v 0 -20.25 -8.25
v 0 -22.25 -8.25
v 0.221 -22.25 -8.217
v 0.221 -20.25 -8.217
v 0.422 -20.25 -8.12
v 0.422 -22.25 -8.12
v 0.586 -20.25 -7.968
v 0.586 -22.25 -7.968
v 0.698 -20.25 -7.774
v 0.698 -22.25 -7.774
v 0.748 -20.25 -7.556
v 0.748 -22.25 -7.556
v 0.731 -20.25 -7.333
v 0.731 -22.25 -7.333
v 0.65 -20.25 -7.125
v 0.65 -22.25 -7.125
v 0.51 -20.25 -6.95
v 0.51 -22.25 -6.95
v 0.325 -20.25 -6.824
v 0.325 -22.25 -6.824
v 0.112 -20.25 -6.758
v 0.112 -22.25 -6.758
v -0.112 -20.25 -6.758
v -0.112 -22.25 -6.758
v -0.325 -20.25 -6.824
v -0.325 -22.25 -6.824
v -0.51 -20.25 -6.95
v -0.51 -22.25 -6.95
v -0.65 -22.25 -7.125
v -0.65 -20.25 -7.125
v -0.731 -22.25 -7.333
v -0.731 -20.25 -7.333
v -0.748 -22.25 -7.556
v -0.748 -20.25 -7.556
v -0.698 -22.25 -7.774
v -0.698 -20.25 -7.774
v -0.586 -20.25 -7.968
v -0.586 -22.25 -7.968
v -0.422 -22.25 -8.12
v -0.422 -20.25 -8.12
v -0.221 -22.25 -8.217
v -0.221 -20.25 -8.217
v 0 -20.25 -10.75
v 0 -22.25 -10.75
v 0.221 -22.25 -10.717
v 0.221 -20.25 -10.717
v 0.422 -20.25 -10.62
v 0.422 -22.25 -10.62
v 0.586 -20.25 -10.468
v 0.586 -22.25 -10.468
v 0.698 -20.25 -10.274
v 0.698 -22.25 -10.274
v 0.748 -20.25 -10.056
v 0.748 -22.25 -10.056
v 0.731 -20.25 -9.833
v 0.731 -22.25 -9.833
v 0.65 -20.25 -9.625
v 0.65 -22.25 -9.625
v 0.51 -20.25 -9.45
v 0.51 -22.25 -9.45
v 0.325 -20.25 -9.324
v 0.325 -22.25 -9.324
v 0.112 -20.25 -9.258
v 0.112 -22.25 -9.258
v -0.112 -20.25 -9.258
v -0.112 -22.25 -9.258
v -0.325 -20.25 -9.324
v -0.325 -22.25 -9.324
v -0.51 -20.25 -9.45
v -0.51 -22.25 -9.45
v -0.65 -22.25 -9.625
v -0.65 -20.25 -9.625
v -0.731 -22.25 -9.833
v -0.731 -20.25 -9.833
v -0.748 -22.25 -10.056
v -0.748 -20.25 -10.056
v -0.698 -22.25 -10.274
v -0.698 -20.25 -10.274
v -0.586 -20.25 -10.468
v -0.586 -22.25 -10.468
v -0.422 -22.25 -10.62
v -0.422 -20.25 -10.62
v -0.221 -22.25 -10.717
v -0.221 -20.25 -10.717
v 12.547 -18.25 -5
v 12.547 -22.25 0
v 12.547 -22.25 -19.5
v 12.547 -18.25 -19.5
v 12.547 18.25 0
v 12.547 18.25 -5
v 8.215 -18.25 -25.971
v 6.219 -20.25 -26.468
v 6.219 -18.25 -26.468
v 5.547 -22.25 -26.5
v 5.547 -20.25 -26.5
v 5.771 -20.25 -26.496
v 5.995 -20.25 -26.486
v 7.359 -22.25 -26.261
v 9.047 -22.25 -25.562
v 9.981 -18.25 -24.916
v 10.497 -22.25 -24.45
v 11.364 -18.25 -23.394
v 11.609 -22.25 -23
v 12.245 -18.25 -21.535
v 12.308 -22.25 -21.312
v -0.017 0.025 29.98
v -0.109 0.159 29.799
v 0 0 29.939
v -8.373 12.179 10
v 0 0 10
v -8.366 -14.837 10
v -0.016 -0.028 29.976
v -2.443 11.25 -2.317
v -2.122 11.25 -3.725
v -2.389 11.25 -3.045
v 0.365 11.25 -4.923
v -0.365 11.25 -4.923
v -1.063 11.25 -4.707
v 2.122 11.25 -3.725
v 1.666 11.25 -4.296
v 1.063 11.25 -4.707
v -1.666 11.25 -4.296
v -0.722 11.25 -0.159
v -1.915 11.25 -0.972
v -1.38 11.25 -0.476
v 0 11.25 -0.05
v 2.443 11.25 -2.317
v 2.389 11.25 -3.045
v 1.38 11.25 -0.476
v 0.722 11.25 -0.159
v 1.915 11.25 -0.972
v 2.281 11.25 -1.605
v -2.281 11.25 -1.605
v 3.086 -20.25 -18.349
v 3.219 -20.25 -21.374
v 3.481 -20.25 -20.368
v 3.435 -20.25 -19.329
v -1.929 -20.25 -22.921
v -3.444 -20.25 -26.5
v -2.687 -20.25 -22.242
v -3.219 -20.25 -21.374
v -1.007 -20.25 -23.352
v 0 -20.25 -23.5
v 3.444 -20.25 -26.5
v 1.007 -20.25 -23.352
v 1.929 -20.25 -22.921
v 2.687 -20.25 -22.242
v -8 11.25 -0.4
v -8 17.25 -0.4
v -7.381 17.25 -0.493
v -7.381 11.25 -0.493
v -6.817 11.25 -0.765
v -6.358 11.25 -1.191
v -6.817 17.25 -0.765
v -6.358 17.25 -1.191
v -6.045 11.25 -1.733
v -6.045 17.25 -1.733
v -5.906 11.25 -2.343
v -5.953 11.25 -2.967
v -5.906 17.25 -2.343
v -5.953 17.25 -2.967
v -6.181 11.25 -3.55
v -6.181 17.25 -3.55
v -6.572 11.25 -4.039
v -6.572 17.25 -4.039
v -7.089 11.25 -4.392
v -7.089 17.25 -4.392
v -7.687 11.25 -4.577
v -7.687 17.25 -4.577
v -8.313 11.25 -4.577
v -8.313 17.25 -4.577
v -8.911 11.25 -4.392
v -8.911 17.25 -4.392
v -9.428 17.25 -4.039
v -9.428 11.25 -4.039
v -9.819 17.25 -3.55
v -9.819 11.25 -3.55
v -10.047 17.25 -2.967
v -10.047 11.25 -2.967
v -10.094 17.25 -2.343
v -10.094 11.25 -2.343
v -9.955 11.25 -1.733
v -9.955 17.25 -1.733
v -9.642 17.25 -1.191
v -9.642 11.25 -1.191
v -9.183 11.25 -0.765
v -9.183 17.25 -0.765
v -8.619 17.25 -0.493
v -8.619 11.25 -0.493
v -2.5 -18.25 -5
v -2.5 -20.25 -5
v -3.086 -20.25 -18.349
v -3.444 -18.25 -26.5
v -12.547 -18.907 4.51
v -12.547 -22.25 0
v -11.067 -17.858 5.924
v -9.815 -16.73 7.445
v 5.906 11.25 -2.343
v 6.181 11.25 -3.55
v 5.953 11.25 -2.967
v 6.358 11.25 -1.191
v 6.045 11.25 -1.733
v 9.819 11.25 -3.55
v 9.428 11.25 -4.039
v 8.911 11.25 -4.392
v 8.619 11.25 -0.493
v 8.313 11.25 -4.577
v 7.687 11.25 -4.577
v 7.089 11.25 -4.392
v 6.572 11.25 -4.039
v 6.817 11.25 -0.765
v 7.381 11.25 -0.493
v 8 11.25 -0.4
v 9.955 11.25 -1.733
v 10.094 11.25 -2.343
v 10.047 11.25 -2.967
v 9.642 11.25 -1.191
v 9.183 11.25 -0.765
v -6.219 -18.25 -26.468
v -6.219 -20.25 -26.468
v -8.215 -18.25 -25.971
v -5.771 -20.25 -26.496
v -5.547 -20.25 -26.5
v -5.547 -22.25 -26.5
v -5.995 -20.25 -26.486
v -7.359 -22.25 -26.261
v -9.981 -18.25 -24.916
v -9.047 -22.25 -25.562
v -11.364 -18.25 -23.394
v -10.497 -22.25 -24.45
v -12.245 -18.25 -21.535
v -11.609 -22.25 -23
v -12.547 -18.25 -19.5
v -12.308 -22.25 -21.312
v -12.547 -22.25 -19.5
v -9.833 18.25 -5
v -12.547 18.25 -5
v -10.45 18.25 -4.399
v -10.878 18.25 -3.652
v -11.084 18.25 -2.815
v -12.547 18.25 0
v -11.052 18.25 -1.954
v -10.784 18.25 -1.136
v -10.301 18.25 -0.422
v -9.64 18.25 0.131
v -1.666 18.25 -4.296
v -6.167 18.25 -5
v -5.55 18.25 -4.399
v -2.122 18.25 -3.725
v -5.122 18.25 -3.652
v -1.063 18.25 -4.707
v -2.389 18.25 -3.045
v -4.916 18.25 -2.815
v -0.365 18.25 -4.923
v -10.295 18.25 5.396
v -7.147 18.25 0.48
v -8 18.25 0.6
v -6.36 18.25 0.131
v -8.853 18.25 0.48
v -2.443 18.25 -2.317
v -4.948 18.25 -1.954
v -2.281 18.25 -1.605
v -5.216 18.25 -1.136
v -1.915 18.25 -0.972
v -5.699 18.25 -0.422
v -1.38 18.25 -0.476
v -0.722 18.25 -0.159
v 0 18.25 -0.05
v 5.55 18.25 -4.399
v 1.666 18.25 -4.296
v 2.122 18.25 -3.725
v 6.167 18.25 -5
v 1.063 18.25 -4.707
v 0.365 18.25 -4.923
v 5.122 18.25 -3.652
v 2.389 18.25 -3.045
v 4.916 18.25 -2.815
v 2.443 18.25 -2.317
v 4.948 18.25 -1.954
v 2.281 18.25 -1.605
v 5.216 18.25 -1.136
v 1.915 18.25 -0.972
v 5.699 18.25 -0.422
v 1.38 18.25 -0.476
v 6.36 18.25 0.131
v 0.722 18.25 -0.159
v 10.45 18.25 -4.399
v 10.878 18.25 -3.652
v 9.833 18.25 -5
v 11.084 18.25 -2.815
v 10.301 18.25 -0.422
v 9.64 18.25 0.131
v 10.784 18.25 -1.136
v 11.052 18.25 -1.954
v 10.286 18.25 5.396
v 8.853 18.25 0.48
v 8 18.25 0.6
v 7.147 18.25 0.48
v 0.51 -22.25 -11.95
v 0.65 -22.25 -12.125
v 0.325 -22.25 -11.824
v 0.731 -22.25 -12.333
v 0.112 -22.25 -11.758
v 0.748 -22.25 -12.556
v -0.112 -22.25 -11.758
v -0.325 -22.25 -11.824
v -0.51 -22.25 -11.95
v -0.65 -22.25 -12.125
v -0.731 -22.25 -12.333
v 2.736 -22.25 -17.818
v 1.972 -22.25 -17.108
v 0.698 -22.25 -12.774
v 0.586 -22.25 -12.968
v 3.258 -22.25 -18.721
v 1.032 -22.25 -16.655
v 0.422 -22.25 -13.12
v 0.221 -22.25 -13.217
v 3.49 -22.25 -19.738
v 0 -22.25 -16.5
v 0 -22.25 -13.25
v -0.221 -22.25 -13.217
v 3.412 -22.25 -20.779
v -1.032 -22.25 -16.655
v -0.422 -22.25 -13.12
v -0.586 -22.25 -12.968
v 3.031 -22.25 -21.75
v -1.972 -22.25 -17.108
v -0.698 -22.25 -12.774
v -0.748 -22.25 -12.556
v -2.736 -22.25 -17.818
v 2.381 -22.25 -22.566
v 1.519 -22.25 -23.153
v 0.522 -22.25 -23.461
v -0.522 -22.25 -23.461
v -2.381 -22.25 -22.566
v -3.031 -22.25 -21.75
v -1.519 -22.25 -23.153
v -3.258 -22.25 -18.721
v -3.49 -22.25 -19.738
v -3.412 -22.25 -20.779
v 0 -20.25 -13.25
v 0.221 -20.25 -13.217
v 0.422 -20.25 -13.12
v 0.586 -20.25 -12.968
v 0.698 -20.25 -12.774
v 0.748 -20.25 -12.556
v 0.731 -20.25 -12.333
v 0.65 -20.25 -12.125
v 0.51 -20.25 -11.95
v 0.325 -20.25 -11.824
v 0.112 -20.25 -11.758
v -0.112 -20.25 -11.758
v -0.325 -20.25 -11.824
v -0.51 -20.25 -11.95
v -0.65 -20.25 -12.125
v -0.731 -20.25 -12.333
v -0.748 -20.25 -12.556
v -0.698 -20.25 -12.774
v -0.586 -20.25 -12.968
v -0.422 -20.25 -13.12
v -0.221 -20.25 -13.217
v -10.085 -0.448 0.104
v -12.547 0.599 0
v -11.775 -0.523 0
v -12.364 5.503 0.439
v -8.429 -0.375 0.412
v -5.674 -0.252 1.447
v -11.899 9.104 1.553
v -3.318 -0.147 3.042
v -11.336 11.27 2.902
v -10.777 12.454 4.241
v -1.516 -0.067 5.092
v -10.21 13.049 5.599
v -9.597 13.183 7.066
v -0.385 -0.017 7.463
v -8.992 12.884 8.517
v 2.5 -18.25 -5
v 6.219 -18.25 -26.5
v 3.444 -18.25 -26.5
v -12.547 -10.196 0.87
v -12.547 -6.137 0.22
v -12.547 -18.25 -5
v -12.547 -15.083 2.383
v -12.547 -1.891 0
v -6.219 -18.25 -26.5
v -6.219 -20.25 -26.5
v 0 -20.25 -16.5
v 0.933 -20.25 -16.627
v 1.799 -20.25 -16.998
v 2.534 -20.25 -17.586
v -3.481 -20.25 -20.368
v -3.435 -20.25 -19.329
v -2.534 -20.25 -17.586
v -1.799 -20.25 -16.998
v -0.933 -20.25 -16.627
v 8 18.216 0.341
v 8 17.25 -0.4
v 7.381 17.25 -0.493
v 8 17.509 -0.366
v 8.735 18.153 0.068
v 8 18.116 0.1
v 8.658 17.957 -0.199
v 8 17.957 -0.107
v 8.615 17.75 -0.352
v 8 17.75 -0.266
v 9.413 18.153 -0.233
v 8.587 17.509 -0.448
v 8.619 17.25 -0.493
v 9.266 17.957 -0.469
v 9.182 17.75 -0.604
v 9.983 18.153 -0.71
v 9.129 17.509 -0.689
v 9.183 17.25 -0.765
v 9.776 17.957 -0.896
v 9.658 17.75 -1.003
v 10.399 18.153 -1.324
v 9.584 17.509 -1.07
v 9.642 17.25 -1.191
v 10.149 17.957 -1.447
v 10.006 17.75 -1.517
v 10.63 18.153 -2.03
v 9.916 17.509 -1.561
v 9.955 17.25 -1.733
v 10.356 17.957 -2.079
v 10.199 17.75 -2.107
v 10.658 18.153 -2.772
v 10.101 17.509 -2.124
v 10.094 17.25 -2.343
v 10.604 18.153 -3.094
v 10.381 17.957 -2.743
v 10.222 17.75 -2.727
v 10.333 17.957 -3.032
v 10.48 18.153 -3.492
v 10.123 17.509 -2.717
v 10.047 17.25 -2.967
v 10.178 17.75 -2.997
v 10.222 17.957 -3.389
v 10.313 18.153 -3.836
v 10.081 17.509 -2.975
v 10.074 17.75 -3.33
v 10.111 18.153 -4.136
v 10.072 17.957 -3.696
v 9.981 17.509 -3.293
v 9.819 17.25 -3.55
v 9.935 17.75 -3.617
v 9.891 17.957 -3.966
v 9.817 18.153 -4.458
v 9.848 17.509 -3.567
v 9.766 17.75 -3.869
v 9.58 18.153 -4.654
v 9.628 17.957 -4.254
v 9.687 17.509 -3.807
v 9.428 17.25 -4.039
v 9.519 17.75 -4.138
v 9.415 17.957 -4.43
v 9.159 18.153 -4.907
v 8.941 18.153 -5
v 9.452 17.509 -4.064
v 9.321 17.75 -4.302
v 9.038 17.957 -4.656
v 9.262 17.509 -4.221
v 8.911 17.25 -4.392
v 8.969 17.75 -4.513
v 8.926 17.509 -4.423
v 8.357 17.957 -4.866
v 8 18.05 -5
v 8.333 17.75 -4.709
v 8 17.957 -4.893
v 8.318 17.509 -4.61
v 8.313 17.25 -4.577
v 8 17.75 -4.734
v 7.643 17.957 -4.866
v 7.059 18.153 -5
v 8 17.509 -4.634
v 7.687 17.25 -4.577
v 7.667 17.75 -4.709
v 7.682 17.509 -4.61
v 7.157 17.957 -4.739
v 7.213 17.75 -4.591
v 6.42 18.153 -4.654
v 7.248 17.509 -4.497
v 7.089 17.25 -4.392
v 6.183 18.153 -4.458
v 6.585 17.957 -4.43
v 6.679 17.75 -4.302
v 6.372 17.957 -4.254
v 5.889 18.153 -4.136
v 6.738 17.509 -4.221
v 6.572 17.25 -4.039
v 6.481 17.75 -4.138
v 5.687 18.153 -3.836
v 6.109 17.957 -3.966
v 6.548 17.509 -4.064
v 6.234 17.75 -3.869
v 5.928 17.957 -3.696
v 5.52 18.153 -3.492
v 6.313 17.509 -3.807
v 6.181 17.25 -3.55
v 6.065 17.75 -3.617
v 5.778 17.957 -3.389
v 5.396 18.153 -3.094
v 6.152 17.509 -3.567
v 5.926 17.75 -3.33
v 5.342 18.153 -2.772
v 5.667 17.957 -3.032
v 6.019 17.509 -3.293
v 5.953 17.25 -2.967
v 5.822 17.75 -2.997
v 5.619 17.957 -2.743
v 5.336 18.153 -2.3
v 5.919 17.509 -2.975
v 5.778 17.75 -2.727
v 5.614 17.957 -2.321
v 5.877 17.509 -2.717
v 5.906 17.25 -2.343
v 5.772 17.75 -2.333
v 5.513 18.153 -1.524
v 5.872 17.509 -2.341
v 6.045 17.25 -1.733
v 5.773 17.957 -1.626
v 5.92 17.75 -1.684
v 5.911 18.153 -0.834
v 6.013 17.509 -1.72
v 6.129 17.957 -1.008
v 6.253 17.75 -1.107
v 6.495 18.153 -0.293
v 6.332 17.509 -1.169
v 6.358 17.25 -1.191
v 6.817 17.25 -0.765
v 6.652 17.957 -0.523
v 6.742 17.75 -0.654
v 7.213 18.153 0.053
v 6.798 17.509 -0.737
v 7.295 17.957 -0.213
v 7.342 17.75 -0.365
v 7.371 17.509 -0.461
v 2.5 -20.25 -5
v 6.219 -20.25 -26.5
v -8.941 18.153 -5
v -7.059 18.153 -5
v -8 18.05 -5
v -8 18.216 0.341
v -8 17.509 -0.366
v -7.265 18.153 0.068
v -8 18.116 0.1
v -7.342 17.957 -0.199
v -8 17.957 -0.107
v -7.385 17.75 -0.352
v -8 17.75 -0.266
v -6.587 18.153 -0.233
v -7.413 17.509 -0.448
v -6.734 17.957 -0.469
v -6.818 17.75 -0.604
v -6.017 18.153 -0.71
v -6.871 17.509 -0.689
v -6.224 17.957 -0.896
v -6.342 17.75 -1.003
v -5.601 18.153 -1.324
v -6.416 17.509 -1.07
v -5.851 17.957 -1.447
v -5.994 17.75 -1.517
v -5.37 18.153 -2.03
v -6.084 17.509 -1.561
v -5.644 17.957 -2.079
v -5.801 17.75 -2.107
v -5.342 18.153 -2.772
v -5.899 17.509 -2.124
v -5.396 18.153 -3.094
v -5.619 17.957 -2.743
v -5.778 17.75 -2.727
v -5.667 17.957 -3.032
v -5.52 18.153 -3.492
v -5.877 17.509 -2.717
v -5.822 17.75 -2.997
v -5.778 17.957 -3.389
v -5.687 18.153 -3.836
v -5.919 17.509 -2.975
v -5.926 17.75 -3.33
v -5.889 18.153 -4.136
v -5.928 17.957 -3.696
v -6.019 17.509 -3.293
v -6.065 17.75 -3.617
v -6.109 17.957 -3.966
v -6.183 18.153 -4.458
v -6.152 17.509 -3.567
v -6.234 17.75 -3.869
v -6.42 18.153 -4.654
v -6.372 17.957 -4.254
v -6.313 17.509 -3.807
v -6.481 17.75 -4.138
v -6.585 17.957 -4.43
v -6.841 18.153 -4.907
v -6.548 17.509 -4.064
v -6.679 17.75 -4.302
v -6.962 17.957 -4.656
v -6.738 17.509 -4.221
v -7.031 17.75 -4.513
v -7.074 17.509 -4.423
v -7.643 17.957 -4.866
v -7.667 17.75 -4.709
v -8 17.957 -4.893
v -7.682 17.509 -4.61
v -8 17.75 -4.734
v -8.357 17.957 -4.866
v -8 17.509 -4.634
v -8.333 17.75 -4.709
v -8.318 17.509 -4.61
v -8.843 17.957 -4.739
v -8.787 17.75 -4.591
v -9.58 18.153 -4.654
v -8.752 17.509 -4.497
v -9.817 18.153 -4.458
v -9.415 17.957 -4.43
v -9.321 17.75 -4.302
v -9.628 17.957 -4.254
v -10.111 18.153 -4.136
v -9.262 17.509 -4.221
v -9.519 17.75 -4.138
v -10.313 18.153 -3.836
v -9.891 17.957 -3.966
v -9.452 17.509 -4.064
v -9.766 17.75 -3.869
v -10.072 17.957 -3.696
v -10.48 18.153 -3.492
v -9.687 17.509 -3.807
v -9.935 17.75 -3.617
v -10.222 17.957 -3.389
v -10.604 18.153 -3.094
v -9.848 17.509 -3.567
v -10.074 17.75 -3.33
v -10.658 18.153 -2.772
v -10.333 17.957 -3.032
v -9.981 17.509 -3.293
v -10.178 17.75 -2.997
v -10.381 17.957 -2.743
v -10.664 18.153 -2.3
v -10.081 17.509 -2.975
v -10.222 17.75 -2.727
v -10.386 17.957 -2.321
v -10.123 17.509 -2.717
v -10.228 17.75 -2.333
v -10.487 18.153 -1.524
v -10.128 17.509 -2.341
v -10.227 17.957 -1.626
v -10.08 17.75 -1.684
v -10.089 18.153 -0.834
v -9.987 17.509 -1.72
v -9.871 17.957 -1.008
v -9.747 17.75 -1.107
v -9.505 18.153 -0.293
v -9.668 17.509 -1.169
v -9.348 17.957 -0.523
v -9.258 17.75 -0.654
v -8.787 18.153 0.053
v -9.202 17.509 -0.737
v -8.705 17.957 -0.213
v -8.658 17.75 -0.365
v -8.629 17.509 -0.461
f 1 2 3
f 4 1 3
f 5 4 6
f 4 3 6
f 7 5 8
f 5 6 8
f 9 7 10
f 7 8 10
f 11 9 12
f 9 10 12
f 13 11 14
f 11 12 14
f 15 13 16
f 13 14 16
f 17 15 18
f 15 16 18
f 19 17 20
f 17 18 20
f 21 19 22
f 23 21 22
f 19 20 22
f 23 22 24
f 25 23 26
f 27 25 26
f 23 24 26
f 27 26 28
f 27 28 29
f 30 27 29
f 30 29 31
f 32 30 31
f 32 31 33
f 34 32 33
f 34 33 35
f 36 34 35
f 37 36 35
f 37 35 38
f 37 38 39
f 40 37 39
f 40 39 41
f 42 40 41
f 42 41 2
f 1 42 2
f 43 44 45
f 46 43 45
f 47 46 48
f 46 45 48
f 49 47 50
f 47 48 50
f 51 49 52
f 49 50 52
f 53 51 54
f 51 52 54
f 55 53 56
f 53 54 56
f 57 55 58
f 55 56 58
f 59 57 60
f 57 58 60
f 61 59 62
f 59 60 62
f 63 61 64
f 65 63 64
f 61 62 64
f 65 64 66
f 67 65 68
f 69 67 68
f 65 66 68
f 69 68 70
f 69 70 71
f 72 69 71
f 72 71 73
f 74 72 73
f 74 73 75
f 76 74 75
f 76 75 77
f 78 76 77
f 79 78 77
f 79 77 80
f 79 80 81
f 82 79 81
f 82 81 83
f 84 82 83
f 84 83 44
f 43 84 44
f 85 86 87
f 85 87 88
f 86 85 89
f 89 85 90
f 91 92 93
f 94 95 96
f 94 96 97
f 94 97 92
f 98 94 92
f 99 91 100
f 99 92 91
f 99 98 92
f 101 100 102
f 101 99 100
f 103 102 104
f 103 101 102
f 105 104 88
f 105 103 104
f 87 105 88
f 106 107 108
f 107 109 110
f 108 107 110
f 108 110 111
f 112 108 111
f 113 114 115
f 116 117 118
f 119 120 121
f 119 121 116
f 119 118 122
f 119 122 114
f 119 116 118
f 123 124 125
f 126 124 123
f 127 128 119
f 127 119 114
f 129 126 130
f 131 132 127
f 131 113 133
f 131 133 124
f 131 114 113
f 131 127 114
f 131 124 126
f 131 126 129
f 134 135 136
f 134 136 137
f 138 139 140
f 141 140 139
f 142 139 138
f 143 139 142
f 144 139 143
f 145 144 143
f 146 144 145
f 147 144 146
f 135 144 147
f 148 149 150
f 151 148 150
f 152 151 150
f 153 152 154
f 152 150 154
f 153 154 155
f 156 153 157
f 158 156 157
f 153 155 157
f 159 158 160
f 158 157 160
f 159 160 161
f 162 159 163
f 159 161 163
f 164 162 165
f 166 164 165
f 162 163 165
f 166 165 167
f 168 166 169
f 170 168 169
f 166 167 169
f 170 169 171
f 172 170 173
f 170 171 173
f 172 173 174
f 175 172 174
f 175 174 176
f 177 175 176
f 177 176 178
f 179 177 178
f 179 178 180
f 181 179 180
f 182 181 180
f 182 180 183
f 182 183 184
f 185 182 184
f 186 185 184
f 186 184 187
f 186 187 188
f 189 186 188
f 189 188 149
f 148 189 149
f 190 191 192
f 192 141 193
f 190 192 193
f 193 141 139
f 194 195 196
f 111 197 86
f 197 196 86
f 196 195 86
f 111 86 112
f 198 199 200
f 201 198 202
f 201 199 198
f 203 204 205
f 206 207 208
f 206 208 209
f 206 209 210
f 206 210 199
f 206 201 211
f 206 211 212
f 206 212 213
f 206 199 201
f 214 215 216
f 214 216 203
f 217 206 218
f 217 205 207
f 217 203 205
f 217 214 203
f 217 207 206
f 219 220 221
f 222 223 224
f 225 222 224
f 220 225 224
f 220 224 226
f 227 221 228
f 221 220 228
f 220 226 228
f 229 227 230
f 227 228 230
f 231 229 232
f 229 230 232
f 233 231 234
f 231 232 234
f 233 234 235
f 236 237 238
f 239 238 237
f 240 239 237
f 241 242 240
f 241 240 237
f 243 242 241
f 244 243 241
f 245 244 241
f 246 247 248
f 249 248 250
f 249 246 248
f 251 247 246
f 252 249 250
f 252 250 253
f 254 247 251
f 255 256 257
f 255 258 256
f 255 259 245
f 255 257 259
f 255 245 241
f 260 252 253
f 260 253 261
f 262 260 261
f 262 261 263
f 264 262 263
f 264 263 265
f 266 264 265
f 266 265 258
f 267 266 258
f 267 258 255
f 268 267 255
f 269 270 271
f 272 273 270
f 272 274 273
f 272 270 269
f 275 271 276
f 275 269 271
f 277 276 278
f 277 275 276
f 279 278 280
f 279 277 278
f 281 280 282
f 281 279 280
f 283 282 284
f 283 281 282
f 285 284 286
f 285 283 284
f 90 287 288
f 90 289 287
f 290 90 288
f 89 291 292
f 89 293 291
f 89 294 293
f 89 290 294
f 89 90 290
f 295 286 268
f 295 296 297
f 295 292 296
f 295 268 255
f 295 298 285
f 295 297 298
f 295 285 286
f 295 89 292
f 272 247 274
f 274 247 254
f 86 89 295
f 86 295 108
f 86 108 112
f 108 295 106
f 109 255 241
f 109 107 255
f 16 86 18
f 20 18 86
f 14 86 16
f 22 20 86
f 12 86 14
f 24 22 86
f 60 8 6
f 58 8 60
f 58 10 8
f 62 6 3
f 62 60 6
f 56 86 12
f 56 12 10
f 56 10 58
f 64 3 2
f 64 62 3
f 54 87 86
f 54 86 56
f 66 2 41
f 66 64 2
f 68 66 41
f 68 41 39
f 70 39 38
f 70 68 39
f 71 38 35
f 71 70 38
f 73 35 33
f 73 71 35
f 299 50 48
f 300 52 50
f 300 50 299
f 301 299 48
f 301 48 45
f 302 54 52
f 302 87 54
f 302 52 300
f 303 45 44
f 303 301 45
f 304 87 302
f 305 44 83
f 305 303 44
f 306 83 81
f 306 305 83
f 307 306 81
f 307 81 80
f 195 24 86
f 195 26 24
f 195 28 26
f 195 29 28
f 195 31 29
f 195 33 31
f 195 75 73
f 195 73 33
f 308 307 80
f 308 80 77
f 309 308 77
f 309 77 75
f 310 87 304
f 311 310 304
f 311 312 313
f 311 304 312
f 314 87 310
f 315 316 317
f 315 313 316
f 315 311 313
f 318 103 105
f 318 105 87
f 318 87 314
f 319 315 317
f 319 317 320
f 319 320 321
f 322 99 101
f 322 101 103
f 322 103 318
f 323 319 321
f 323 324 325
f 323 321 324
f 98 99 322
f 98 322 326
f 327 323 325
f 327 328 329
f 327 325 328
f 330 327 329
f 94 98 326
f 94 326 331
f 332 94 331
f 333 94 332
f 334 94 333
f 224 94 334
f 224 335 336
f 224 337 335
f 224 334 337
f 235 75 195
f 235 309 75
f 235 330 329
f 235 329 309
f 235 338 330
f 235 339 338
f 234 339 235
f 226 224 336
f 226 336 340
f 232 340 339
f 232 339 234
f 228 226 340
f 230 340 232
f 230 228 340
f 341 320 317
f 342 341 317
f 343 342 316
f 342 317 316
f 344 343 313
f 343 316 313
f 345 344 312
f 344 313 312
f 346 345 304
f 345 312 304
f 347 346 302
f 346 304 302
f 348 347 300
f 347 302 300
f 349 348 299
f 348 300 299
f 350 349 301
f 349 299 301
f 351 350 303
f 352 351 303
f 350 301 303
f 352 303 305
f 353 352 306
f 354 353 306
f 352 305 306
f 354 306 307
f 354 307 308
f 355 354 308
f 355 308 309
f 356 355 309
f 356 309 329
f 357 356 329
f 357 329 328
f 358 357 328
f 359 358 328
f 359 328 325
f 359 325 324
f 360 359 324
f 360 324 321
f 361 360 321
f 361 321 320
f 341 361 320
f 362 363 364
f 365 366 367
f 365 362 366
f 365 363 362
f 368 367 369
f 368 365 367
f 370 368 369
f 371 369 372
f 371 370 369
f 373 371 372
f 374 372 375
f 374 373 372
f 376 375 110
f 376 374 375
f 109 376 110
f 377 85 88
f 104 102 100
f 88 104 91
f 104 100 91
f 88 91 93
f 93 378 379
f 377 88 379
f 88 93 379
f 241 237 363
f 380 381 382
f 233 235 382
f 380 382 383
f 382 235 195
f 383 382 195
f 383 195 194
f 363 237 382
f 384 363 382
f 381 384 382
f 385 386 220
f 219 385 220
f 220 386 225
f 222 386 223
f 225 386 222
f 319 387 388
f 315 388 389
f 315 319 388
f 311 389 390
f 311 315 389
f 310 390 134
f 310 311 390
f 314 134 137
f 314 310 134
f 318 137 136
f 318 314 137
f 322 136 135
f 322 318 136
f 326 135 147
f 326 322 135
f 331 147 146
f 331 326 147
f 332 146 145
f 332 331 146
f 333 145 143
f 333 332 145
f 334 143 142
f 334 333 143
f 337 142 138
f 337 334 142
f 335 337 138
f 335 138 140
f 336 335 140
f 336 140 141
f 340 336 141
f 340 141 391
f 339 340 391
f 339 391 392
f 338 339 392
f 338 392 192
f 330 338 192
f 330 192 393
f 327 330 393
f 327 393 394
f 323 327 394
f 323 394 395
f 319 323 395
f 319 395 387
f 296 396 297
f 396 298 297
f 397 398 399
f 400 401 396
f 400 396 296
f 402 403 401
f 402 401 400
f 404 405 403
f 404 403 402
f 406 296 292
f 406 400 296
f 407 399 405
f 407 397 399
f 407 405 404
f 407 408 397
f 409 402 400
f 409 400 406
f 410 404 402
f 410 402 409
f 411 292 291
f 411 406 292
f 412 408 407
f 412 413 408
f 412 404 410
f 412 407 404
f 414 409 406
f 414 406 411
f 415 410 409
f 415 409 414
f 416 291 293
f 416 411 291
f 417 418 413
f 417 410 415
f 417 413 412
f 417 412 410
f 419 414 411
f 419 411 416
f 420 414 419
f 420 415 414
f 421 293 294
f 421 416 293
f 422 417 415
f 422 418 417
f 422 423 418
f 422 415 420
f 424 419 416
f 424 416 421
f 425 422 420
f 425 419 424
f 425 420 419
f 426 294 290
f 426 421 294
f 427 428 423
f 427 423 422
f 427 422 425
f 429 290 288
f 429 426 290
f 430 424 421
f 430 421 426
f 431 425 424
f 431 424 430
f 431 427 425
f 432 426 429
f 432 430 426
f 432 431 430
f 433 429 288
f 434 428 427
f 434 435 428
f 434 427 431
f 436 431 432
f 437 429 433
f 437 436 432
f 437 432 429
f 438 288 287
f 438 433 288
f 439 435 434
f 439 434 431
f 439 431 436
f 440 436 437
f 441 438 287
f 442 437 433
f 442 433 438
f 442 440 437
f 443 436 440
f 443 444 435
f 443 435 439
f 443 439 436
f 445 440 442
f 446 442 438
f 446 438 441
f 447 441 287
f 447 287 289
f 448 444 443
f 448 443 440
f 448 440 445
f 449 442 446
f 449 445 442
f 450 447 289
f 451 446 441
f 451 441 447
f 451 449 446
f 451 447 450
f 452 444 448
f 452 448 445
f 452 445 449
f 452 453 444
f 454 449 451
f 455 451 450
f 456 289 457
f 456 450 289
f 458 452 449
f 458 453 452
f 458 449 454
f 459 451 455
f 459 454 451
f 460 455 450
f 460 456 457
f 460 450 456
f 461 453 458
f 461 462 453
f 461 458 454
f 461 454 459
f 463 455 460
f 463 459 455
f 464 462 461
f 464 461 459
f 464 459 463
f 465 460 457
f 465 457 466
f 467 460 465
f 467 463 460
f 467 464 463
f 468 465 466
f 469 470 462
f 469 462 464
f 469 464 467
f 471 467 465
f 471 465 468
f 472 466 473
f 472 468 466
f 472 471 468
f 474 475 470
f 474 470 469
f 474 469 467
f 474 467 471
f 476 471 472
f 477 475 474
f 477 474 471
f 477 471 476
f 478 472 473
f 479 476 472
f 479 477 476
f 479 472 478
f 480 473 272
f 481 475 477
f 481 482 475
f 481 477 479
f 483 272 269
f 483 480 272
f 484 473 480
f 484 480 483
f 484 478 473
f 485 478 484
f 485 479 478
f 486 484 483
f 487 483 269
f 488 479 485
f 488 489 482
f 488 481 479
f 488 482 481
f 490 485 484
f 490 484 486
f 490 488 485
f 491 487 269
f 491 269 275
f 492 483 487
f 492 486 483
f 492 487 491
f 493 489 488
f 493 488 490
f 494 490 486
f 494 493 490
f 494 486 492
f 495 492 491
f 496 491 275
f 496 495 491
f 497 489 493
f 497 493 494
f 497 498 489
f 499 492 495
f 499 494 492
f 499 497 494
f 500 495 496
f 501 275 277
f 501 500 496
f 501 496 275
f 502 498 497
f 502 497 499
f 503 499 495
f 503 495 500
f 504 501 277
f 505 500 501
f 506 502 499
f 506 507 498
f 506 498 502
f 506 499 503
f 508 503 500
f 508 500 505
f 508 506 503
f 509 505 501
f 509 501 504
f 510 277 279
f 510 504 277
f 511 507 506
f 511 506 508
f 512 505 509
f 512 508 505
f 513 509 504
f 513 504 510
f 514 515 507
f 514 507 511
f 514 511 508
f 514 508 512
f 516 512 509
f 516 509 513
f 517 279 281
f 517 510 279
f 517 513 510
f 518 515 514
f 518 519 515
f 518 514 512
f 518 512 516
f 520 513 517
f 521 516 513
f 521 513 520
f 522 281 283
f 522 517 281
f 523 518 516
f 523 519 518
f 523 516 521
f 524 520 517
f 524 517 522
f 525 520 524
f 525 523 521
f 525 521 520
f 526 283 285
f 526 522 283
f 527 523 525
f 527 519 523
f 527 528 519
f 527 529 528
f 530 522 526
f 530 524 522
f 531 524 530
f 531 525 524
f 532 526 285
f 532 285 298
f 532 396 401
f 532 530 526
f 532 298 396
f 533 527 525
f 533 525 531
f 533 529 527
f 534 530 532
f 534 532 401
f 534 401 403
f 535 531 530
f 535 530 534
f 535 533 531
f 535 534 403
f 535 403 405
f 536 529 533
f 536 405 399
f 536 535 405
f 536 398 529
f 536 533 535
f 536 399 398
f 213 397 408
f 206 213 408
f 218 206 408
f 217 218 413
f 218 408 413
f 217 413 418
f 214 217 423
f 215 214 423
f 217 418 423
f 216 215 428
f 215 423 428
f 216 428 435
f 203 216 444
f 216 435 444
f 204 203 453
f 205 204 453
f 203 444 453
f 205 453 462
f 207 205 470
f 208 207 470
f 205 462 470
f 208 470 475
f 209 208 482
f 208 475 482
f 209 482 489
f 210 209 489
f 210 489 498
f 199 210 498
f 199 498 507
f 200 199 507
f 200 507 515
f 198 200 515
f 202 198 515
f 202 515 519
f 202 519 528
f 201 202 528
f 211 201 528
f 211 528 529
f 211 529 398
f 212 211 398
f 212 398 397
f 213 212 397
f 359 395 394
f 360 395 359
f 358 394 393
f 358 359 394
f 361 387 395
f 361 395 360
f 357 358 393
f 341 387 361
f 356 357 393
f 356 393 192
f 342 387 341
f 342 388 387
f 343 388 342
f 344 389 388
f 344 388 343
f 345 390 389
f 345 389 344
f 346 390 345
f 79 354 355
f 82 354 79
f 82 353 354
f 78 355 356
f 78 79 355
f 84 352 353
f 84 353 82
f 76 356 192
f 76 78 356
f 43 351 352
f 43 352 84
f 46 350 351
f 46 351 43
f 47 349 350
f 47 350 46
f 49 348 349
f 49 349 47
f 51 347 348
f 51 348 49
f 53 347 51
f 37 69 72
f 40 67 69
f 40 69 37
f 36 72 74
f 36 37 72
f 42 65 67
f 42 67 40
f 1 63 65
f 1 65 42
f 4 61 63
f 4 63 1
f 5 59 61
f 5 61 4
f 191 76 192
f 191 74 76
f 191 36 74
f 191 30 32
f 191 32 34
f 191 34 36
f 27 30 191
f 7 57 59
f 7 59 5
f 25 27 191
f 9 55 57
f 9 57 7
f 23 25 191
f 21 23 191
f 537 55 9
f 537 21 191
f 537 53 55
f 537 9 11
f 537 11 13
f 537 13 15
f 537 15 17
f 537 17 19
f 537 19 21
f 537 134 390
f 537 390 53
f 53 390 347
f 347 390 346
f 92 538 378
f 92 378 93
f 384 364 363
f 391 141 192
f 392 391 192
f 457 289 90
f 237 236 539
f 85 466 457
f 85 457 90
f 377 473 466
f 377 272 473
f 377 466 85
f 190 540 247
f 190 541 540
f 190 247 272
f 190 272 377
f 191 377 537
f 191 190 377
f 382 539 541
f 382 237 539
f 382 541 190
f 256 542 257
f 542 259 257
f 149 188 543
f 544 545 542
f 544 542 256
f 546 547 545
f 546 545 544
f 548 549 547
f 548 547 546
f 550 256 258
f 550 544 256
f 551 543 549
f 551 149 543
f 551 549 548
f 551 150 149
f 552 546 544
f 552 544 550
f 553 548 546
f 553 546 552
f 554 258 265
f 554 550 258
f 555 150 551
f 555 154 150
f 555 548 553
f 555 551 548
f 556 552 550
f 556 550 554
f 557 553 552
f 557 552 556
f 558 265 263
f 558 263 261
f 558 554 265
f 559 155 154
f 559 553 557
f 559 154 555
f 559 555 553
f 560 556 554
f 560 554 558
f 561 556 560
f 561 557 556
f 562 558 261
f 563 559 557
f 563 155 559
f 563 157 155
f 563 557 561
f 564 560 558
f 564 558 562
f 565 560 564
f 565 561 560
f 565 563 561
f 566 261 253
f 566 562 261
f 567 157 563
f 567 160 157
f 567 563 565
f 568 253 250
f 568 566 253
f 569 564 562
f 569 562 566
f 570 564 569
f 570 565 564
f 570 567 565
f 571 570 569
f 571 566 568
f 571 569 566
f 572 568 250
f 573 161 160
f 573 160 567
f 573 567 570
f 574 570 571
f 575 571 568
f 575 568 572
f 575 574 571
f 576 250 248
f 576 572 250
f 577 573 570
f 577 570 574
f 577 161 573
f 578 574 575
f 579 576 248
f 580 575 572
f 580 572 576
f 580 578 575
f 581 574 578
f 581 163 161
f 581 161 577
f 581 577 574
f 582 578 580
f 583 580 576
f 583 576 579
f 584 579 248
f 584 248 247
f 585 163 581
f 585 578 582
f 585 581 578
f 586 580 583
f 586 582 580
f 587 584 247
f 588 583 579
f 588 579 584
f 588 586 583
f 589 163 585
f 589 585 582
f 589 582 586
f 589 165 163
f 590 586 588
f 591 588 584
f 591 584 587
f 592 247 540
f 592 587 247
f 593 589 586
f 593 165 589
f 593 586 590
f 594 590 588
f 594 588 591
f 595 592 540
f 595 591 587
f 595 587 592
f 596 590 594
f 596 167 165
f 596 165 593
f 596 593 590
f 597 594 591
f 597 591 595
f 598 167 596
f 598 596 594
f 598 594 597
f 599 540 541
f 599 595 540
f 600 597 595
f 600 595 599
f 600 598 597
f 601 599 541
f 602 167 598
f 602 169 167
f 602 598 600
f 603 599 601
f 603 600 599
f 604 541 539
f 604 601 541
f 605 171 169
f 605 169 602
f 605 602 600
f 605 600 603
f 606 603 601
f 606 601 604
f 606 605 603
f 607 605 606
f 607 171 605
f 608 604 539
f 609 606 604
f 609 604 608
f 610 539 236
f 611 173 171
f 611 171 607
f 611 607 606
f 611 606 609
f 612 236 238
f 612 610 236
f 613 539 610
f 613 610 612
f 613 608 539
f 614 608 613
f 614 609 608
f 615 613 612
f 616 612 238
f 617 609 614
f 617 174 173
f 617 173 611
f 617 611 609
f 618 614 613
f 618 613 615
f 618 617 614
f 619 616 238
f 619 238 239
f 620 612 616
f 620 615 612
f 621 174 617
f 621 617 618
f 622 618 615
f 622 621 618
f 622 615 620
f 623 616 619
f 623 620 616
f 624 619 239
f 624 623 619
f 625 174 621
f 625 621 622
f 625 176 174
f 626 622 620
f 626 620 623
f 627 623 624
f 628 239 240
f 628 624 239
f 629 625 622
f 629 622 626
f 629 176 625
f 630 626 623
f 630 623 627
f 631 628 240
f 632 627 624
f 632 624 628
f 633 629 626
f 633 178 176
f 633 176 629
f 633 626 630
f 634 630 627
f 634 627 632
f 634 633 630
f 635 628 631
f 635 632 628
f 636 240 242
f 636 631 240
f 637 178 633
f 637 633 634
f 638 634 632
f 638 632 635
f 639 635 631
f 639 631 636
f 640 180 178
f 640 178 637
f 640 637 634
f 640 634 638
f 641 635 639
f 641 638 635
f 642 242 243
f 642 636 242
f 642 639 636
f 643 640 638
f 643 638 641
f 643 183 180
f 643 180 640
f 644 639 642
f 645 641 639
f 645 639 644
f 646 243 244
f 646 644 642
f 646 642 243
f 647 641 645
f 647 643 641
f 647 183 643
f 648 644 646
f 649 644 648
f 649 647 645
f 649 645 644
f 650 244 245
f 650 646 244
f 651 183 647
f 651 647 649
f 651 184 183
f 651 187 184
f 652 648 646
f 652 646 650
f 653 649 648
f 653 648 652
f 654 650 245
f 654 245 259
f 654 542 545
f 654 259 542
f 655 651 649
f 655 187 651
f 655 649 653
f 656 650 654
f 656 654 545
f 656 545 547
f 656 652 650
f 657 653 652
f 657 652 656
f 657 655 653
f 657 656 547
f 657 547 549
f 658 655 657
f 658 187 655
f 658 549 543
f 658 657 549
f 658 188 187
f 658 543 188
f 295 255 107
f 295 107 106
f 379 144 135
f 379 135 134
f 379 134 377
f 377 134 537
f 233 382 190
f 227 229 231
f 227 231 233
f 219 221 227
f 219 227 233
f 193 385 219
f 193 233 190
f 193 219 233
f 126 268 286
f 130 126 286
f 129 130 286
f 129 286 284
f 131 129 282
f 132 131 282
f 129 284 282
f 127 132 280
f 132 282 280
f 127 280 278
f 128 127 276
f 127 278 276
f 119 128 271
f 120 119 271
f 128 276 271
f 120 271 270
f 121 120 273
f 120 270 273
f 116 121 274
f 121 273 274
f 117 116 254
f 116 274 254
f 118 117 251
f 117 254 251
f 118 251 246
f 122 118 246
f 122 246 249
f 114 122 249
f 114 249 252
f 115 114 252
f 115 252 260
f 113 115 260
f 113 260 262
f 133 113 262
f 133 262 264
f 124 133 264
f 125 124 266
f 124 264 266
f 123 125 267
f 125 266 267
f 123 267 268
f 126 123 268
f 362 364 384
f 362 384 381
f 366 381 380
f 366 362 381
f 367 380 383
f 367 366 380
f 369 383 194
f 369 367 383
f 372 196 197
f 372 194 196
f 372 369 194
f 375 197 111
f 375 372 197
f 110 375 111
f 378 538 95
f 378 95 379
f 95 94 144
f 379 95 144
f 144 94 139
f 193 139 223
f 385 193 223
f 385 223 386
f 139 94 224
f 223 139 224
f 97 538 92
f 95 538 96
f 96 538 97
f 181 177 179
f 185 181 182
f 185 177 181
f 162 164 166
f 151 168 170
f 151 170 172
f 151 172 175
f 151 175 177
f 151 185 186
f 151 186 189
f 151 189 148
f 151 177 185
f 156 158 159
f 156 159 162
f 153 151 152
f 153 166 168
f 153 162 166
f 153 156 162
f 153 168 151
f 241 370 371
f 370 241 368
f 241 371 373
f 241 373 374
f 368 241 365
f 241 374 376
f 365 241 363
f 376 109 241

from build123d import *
from OCP.BRepFilletAPI import BRepFilletAPI_MakeChamfer

# Parameters (mm, degrees)
SKETCH4_W                = 12.46
SKETCH4_H                = 17.25
BOSS_EXTRUDE3_DEPTH      = 6
BOSS_EXTRUDE6_DEPTH      = 7.3
BOSS_EXTRUDE6_DEPTH_BACK = 17.25
SKETCH8_R                = 12.546781182
SKETCH8_R_2              = 11.15
BOSS_EXTRUDE4_DEPTH      = 17.25
SKETCH6_R                = 2
CUT_EXTRUDE1_DEPTH       = 5
CHAMFER1_SIZE            = 0.5
CHAMFER1_SIZE_2          = 0.866025404
SKETCH10_W               = 12.46
SKETCH10_H               = 23.7
CUT_EXTRUDE3_DEPTH       = 17.25
CUT_EXTRUDE4_REACH       = 43.938
SKETCH11_W               = 5
SKETCH11_H               = 3
BOSS_EXTRUDE7_START      = -7.3
BOSS_EXTRUDE7_DEPTH      = 7.3
BOSS_EXTRUDE9_START      = 10
BOSS_EXTRUDE9_DEPTH      = 10
BOSS_EXTRUDE10_DEPTH     = 25.093562364
SKETCH18_W               = 21.5
SKETCH18_H               = 12.438292938
CUT_EXTRUDE5_DEPTH       = 2
CUT_EXTRUDE6_DEPTH       = 58.154608998
CUT_EXTRUDE6_DEPTH_BACK  = 58.154608998
SKETCH19_R               = 3.5
FILLET1_R                = 7
CUT_EXTRUDE7_DEPTH       = 55.97840444
CUT_EXTRUDE7_DEPTH_BACK  = 55.97840444
SKETCH20_W               = 25.093562364
SKETCH20_H               = 36.096781182
BOSS_EXTRUDE11_DEPTH     = 44.5
CUT_EXTRUDE8_DEPTH       = 40.401576339
CUT_EXTRUDE8_DEPTH_BACK  = 40.401576339
CUT_EXTRUDE9_DEPTH       = 40.401576339
SKETCH24_R               = 6.5
BOSS_EXTRUDE12_DEPTH     = 5
SKETCH25_R               = 6.075
BOSS_EXTRUDE13_DEPTH     = 5
FILLET2_R                = 1
BOSS_EXTRUDE14_DEPTH     = 2
CUT_EXTRUDE10_REACH      = 57.104
SKETCH27_R               = 0.75
CUT_EXTRUDE11_DEPTH      = 45.983908275
SKETCH29_R               = 2.1
SKETCH29_R_2             = 2.45
CUT_EXTRUDE12_DEPTH      = 7
FILLET3_R                = 10
FILLET4_R                = 1


# Some blends are built 0.0001 mm under size
with BuildPart() as part:
    # Sketch4 → Boss-Extrude3 (new body)
    with BuildSketch(Plane.XY):
        with Locations((0, -1.35)):
            Rectangle(SKETCH4_W, SKETCH4_H)
    extrude(amount=BOSS_EXTRUDE3_DEPTH)



with BuildPart() as body_2:
    # Sketch8 → Boss-Extrude6 (new, two sides: drawn at the far end of the back side and taken through both)
    with BuildSketch(Plane(origin=(0, -9.975, 0), x_dir=(-1, 0, 0), z_dir=(0, -1, 0)).offset(-BOSS_EXTRUDE6_DEPTH_BACK)):
        with Locations(Location((0, -23.55, 0), (0, 0, 90))):
            Circle(SKETCH8_R)
        with Locations(Location((0, -23.55, 0), (0, 0, 90))):
            Circle(SKETCH8_R_2, mode=Mode.SUBTRACT)
    extrude(amount=BOSS_EXTRUDE6_DEPTH + BOSS_EXTRUDE6_DEPTH_BACK)


with BuildPart() as part_1:
    add(part.part)

    add(body_2.part)  # Boss-Extrude4 merges body 2
    # Sketch5 → Boss-Extrude4 (add)
    with BuildSketch(Plane(origin=(0, 7.275, 0), x_dir=(1, 0, 0), z_dir=(0, 1, 0))):
        with BuildLine():
            Line((12.546781182, -23.55), (12.546781182, 0))
            Line((12.546781182, 0), (6.23, 0))
            Line((6.23, 0), (6.23, -29.7))
            Line((6.23, -29.7), (-6.23, -29.7))
            Line((-6.23, -29.7), (-6.23, 0))
            Line((-6.23, 0), (-12.546781182, 0))
            Line((-12.546781182, 0), (-12.546781182, -23.55))
            ThreePointArc((-12.546781182, -23.55), (0, -36.096781182), (12.546781182, -23.55))
        make_face()
    extrude(amount=-BOSS_EXTRUDE4_DEPTH)

    # Sketch6 → Cut-Extrude1 (cut)
    with BuildSketch(Plane(origin=(0, 7.275, 0), x_dir=(1, 0, 0), z_dir=(0, 1, 0))):
        with Locations(Location((0, -3.5, 0), (0, 0, 270))):
            Circle(SKETCH6_R)
        with Locations(Location((0, -32.2, 0), (0, 0, 270))):
            Circle(SKETCH6_R)
    extrude(amount=-CUT_EXTRUDE1_DEPTH, mode=Mode.SUBTRACT)

    # Chamfer1
    chamfer1_edges_1 = [part_1.edges().sort_by_distance(p)[0] for p in [
        (0, 7.275, 1.5),
    ]]
    chamfer1_side_1 = [part_1.faces().sort_by_distance(p)[0] for p in [
        (0, 7.275, 1.49),
    ]]
    chamfer1_edges_2 = [part_1.edges().sort_by_distance(p)[0] for p in [
        (0, 7.275, 30.2),
    ]]
    chamfer1_side_2 = [part_1.faces().sort_by_distance(p)[0] for p in [
        (0, 7.275, 30.19),
    ]]
    chamfer1 = BRepFilletAPI_MakeChamfer(part_1.part.solid().wrapped)
    for e in chamfer1_edges_1:
        chamfer1.Add(CHAMFER1_SIZE - 0.0001, CHAMFER1_SIZE_2 - 0.0001, e.wrapped, chamfer1_side_1[0].wrapped)
    for e in chamfer1_edges_2:
        chamfer1.Add(CHAMFER1_SIZE - 0.0001, CHAMFER1_SIZE_2 - 0.0001, e.wrapped, chamfer1_side_2[0].wrapped)
    add(Compound.cast(chamfer1.Shape()), mode=Mode.REPLACE)  # a hair under: the kernel refuses the full size

    # Sketch10 → Cut-Extrude3 (cut)
    with BuildSketch(Plane(origin=(0, 7.275, 0), x_dir=(1, 0, 0), z_dir=(0, 1, 0))):
        with Locations((0, -17.85)):
            Rectangle(SKETCH10_W, SKETCH10_H)
    extrude(amount=-CUT_EXTRUDE3_DEPTH, mode=Mode.SUBTRACT)

    # Sketch11 → Cut-Extrude4 (cut, up to next)
    with BuildSketch(Plane.XY.offset(36.096781182), mode=Mode.PRIVATE) as cut_extrude4_sk1:
        with Locations((0, -8.475)):
            Rectangle(SKETCH11_W, SKETCH11_H)
    cut_extrude4_tool1 = extrude(cut_extrude4_sk1.sketch, amount=-CUT_EXTRUDE4_REACH, mode=Mode.PRIVATE) & part_1.part
    add(cut_extrude4_tool1.solids().sort_by_distance((0, -8.475, 36.096781))[0], mode=Mode.SUBTRACT)

    # Sketch13 → Boss-Extrude7 (add)
    with BuildSketch(Plane.XZ.offset(17.275).offset(BOSS_EXTRUDE7_START)):
        with BuildLine():
            Line((-12.546781182, 23.55), (-12.546781182, 0))
            Line((-12.546781182, 0), (12.546781182, 0))
            Line((12.546781182, 0), (12.546781182, 23.55))
            ThreePointArc((12.546781182, 23.55), (0, 11.003218818), (-12.546781182, 23.55))
        make_face()
    extrude(amount=BOSS_EXTRUDE7_DEPTH)

    # Sketch15 → Boss-Extrude9 (add)
    with BuildSketch(Plane(origin=(0, 7.275, 0), x_dir=(1, 0, 0), z_dir=(0, 1, 0)).offset(BOSS_EXTRUDE9_START)):
        with BuildLine():
            Line((-12.546781182, 0), (12.546781182, 0))
            Line((12.546781182, 0), (12.546781182, -23.55))
            ThreePointArc((12.546781182, -23.55), (0, -36.096781182), (-12.546781182, -23.55))
            Line((-12.546781182, -23.55), (-12.546781182, 0))
        make_face()
        with BuildLine():
            Line((-6.23, -0.8), (6.23, -0.8))
            Line((6.23, -0.8), (6.23, -33.5))
            ThreePointArc((6.23, -33.5), (5.937106781, -34.207106781), (5.23, -34.5))
            Line((5.23, -34.5), (-5.23, -34.5))
            ThreePointArc((-5.23, -34.5), (-5.937106781, -34.207106781), (-6.23, -33.5))
            Line((-6.23, -33.5), (-6.23, -0.8))
        make_face(mode=Mode.SUBTRACT)
    extrude(amount=-BOSS_EXTRUDE9_DEPTH)

    # Sketch17 → Boss-Extrude10 (add)
    with BuildSketch(Plane(origin=(-12.546781182, 4.728218818, 0), x_dir=(0, -1, 0), z_dir=(1, 0, 0))):
        Polygon((26.978218818, 26.5), (26.978218818, 0), (-17.521781182, 0), (-17.521781182, 26.5), (-13.521781182, 26.5), (-13.521781182, 5), (22.978218818, 5), (22.978218818, 26.5), align=None)
    extrude(amount=BOSS_EXTRUDE10_DEPTH)

    # Sketch18 → Cut-Extrude5 (cut)
    with BuildSketch(Plane.ZX.offset(-18.25)):
        with Locations((-15.75, 0)):
            Rectangle(SKETCH18_W, SKETCH18_H)
    extrude(amount=-CUT_EXTRUDE5_DEPTH, mode=Mode.SUBTRACT)

    # Sketch19 → Cut-Extrude6 (cut, two sides: drawn at the far end of the back side and taken through both)
    with BuildSketch(Plane.ZX.offset(-20.25).offset(-CUT_EXTRUDE6_DEPTH_BACK)):
        with Locations((-20, 0)):
            Circle(SKETCH19_R)
    extrude(amount=CUT_EXTRUDE6_DEPTH + CUT_EXTRUDE6_DEPTH_BACK, mode=Mode.SUBTRACT)

    # Fillet1
    fillet1_edges = [part_1.edges().sort_by_distance(p)[0] for p in [
        (12.546781182, -20.25, -26.5),
        (-12.546781182, -20.25, -26.5),
        (-12.546781182, 20.25, -26.5),
        (12.546781182, 20.25, -26.5),
    ]]
    fillet(fillet1_edges, radius=FILLET1_R)

    # Sketch20 → Cut-Extrude7 (cut, two sides: drawn at the far end of the back side and taken through both)
    with BuildSketch(Plane(origin=(0, 17.275, 0), x_dir=(1, 0, 0), z_dir=(0, 1, 0)).offset(-CUT_EXTRUDE7_DEPTH_BACK)):
        with Locations((0, -18.048390591)):
            Rectangle(SKETCH20_W, SKETCH20_H)
    extrude(amount=CUT_EXTRUDE7_DEPTH + CUT_EXTRUDE7_DEPTH_BACK, mode=Mode.SUBTRACT)

    # Sketch21 → Boss-Extrude11 (add)
    with BuildSketch(Plane(origin=(0, 22.25, 0), x_dir=(1, 0, 0), z_dir=(0, 1, 0))):
        Polygon((12.546781182, 0), (-0.025415104, -30), (-12.546781182, 0), align=None)
    extrude(amount=-BOSS_EXTRUDE11_DEPTH)

    # Sketch22 → Cut-Extrude8 (cut, two sides: drawn at the far end of the back side and taken through both)
    with BuildSketch(Plane(origin=(0, 0, 0), x_dir=(0, 0, -1), z_dir=(1, 0, 0)).offset(-CUT_EXTRUDE8_DEPTH_BACK)):
        Polygon((0, 22.25), (-30, 0.01), (-30, 22.25), align=None)
        Polygon((0, -22.25), (-30, -22.25), (-30, -0.01), align=None)
    extrude(amount=CUT_EXTRUDE8_DEPTH + CUT_EXTRUDE8_DEPTH_BACK, mode=Mode.SUBTRACT)

    # Sketch23 → Cut-Extrude9 (cut, through all)
    with BuildSketch(Plane(origin=(0, 0, 0), x_dir=(-1, 0, 0), z_dir=(0, 0, -1))):
        Polygon((12.546781182, 18.25), (0, 0), (12.546781182, -22.25), align=None)
    extrude(amount=-CUT_EXTRUDE9_DEPTH, mode=Mode.SUBTRACT)

    # Sketch24 → Boss-Extrude12 (add)
    with BuildSketch(Plane(origin=(0, 22.25, 0), x_dir=(1, 0, 0), z_dir=(0, 1, 0))):
        with Locations(Location((0, 20, 0), (0, 0, 270))):
            Circle(SKETCH24_R)
    extrude(amount=-BOSS_EXTRUDE12_DEPTH)

    # Sketch25 → Boss-Extrude13 (add)
    with BuildSketch(Plane.XZ.offset(-17.25)):
        with Locations(Location((0, -20, 0), (0, 0, 270))):
            Circle(SKETCH25_R)
    extrude(amount=BOSS_EXTRUDE13_DEPTH)

    # Fillet2
    fillet2_edges = [part_1.edges().sort_by_distance(p)[0] for p in [
        (0, 12.25, -13.925),
    ]]
    fillet(fillet2_edges, radius=FILLET2_R)

    # Sketch26 → Boss-Extrude14 (add)
    with BuildSketch(Plane(origin=(0, -20.25, 0), x_dir=(1, 0, 0), z_dir=(0, 1, 0))):
        Polygon((-6.219146469, 5), (-2.5, 5), (-3.1585, 20), (-3.44385, 26.5), (-6.219146469, 26.5), align=None)
        Polygon((3.1585, 20), (3.44385, 26.5), (6.219146469, 26.5), (6.219146469, 5), (2.5, 5), align=None)
    extrude(amount=BOSS_EXTRUDE14_DEPTH)

    # Sketch27 → Cut-Extrude10 (cut, up to next)
    with BuildSketch(Plane.XZ.offset(22.25), mode=Mode.PRIVATE) as cut_extrude10_sk1:
        with Locations(Location((0, -10, 0), (0, 0, 270))):
            Circle(SKETCH27_R)
    cut_extrude10_tool1 = extrude(cut_extrude10_sk1.sketch, amount=-CUT_EXTRUDE10_REACH, mode=Mode.PRIVATE) & part_1.part
    # Sketch27 → Cut-Extrude10 (cut, up to next)
    with BuildSketch(Plane.XZ.offset(22.25), mode=Mode.PRIVATE) as cut_extrude10_sk2:
        with Locations(Location((0, -7.5, 0), (0, 0, 270))):
            Circle(SKETCH27_R)
    cut_extrude10_tool2 = extrude(cut_extrude10_sk2.sketch, amount=-CUT_EXTRUDE10_REACH, mode=Mode.PRIVATE) & part_1.part
    # Sketch27 → Cut-Extrude10 (cut, up to next)
    with BuildSketch(Plane.XZ.offset(22.25), mode=Mode.PRIVATE) as cut_extrude10_sk3:
        with Locations(Location((0, -12.5, 0), (0, 0, 270))):
            Circle(SKETCH27_R)
    cut_extrude10_tool3 = extrude(cut_extrude10_sk3.sketch, amount=-CUT_EXTRUDE10_REACH, mode=Mode.PRIVATE) & part_1.part
    add(cut_extrude10_tool1.solids().sort_by_distance((0, -22.25, -10))[0], mode=Mode.SUBTRACT)
    add(cut_extrude10_tool2.solids().sort_by_distance((0, -22.25, -7.5))[0], mode=Mode.SUBTRACT)
    add(cut_extrude10_tool3.solids().sort_by_distance((0, -22.25, -12.5))[0], mode=Mode.SUBTRACT)

    # Sketch28 → Cut-Extrude11 (cut, through all)
    with BuildSketch(Plane(origin=(12.546781182, 0, 0), x_dir=(0, 0, -1), z_dir=(1, 0, 0))):
        Polygon((5, 18.25), (-20.685656294, 18.25), (-20.685656294, 31.083718117), (38.29343765, 31.083718117), (38.29343765, 6.428054208), (5, 6.428054208), align=None)
    extrude(amount=-CUT_EXTRUDE11_DEPTH, mode=Mode.SUBTRACT)

    # Sketch29 → Cut-Extrude12 (cut)
    with BuildSketch(Plane(origin=(0, 18.25, 0), x_dir=(1, 0, 0), z_dir=(0, 1, 0))):
        with Locations(Location((-8, 2.5, 0), (0, 0, 270))):
            Circle(SKETCH29_R)
        with Locations(Location((0, 2.5, 0), (0, 0, 270))):
            Circle(SKETCH29_R_2)
        with Locations(Location((8, 2.5, 0), (0, 0, 270))):
            Circle(SKETCH29_R)
    extrude(amount=-CUT_EXTRUDE12_DEPTH, mode=Mode.SUBTRACT)

    # Fillet3
    # the kernel refuses this fillet: 10 mm, written as the material it adds along each edge
    with BuildSketch(Plane(origin=(-26.70992984, 38.851097546, 0), x_dir=(-0.8240439018220859, -0.566525946334175, 0), z_dir=(0.5665259463341751, -0.824043901822086, 0))) as fillet3_piece_1_section:
        with BuildLine():
            CenterArc((FILLET3_R, -FILLET3_R), FILLET3_R, 90, 90)
            Line((0, -FILLET3_R), (0, 0))
            Line((0, 0), (FILLET3_R, 0))
        make_face()
    fillet3_piece_1 = extrude(amount=72.146878291, mode=Mode.PRIVATE)
    fillet3_piece_1 = split(fillet3_piece_1, bisect_by=Plane(origin=(-10.851908464, 5.541742766, 4.060753532), z_dir=(0.9228434094782519, 0, -0.38517533875178916)), keep=Keep.TOP, mode=Mode.PRIVATE)
    fillet3_piece_1 = split(fillet3_piece_1, bisect_by=Plane(origin=(0.82769932, 1.467811513, 2.201310623), z_dir=(-0.8710538597344621, 0.49118751352380285, 0)), keep=Keep.TOP, mode=Mode.PRIVATE)
    add(fillet3_piece_1)
    with BuildSketch(Plane(origin=(12.279687838, 21.776346493, 0), x_dir=(-0.8710538597344621, 0.4911875135238028, 0), z_dir=(-0.49118751352380285, -0.8710538597344621, 0))) as fillet3_piece_2_section:
        with BuildLine():
            CenterArc((FILLET3_R, -FILLET3_R), FILLET3_R, 90, 90)
            Line((0, -FILLET3_R), (0, 0))
            Line((0, 0), (FILLET3_R, 0))
        make_face()
    fillet3_piece_2 = extrude(amount=75.543770631, mode=Mode.PRIVATE)
    fillet3_piece_2 = split(fillet3_piece_2, bisect_by=Plane(origin=(-12.546781182, -7.723342909, 2.248116877), z_dir=(1, 0, 0)), keep=Keep.TOP, mode=Mode.PRIVATE)
    fillet3_piece_2 = split(fillet3_piece_2, bisect_by=Plane(origin=(1.437353681, -2.090711896, 2.248116877), z_dir=(-0.8240439018220859, -0.566525946334175, 0)), keep=Keep.TOP, mode=Mode.PRIVATE)
    fillet3_piece_2 = split(fillet3_piece_2, bisect_by=Plane(origin=(-6.755625418, -16.022426329, 8.400504052), z_dir=(0, 0.8033294415309644, -0.5955348926549551)), keep=Keep.TOP, mode=Mode.PRIVATE)
    add(fillet3_piece_2)

    # Fillet4
    # the kernel refuses this fillet: 1 mm, written as the material it takes off along each edge
    with BuildSketch(Plane(origin=(-8, 18.25, -2.5), x_dir=(0, 0, 1), z_dir=(-1, 0, 0))) as fillet4_piece_1:
        with BuildLine():
            CenterArc((2.1 + FILLET4_R, -FILLET4_R), FILLET4_R, 90, 90)
            Line((2.1, -FILLET4_R), (2.1, 0))
            Line((2.1, 0), (2.1 + FILLET4_R, 0))
        make_face()
    revolve(axis=Axis((-8, 18.25, -2.5), (0, 1, 0)), mode=Mode.SUBTRACT)
    with BuildSketch(Plane(origin=(8, 18.25, -2.5), x_dir=(0, 0, 1), z_dir=(-1, 0, 0))) as fillet4_piece_2:
        with BuildLine():
            CenterArc((2.1 + FILLET4_R, -FILLET4_R), FILLET4_R, 90, 90)
            Line((2.1, -FILLET4_R), (2.1, 0))
            Line((2.1, 0), (2.1 + FILLET4_R, 0))
        make_face()
    revolve(axis=Axis((8, 18.25, -2.5), (0, 1, 0)), mode=Mode.SUBTRACT)


solid = part_1.part
